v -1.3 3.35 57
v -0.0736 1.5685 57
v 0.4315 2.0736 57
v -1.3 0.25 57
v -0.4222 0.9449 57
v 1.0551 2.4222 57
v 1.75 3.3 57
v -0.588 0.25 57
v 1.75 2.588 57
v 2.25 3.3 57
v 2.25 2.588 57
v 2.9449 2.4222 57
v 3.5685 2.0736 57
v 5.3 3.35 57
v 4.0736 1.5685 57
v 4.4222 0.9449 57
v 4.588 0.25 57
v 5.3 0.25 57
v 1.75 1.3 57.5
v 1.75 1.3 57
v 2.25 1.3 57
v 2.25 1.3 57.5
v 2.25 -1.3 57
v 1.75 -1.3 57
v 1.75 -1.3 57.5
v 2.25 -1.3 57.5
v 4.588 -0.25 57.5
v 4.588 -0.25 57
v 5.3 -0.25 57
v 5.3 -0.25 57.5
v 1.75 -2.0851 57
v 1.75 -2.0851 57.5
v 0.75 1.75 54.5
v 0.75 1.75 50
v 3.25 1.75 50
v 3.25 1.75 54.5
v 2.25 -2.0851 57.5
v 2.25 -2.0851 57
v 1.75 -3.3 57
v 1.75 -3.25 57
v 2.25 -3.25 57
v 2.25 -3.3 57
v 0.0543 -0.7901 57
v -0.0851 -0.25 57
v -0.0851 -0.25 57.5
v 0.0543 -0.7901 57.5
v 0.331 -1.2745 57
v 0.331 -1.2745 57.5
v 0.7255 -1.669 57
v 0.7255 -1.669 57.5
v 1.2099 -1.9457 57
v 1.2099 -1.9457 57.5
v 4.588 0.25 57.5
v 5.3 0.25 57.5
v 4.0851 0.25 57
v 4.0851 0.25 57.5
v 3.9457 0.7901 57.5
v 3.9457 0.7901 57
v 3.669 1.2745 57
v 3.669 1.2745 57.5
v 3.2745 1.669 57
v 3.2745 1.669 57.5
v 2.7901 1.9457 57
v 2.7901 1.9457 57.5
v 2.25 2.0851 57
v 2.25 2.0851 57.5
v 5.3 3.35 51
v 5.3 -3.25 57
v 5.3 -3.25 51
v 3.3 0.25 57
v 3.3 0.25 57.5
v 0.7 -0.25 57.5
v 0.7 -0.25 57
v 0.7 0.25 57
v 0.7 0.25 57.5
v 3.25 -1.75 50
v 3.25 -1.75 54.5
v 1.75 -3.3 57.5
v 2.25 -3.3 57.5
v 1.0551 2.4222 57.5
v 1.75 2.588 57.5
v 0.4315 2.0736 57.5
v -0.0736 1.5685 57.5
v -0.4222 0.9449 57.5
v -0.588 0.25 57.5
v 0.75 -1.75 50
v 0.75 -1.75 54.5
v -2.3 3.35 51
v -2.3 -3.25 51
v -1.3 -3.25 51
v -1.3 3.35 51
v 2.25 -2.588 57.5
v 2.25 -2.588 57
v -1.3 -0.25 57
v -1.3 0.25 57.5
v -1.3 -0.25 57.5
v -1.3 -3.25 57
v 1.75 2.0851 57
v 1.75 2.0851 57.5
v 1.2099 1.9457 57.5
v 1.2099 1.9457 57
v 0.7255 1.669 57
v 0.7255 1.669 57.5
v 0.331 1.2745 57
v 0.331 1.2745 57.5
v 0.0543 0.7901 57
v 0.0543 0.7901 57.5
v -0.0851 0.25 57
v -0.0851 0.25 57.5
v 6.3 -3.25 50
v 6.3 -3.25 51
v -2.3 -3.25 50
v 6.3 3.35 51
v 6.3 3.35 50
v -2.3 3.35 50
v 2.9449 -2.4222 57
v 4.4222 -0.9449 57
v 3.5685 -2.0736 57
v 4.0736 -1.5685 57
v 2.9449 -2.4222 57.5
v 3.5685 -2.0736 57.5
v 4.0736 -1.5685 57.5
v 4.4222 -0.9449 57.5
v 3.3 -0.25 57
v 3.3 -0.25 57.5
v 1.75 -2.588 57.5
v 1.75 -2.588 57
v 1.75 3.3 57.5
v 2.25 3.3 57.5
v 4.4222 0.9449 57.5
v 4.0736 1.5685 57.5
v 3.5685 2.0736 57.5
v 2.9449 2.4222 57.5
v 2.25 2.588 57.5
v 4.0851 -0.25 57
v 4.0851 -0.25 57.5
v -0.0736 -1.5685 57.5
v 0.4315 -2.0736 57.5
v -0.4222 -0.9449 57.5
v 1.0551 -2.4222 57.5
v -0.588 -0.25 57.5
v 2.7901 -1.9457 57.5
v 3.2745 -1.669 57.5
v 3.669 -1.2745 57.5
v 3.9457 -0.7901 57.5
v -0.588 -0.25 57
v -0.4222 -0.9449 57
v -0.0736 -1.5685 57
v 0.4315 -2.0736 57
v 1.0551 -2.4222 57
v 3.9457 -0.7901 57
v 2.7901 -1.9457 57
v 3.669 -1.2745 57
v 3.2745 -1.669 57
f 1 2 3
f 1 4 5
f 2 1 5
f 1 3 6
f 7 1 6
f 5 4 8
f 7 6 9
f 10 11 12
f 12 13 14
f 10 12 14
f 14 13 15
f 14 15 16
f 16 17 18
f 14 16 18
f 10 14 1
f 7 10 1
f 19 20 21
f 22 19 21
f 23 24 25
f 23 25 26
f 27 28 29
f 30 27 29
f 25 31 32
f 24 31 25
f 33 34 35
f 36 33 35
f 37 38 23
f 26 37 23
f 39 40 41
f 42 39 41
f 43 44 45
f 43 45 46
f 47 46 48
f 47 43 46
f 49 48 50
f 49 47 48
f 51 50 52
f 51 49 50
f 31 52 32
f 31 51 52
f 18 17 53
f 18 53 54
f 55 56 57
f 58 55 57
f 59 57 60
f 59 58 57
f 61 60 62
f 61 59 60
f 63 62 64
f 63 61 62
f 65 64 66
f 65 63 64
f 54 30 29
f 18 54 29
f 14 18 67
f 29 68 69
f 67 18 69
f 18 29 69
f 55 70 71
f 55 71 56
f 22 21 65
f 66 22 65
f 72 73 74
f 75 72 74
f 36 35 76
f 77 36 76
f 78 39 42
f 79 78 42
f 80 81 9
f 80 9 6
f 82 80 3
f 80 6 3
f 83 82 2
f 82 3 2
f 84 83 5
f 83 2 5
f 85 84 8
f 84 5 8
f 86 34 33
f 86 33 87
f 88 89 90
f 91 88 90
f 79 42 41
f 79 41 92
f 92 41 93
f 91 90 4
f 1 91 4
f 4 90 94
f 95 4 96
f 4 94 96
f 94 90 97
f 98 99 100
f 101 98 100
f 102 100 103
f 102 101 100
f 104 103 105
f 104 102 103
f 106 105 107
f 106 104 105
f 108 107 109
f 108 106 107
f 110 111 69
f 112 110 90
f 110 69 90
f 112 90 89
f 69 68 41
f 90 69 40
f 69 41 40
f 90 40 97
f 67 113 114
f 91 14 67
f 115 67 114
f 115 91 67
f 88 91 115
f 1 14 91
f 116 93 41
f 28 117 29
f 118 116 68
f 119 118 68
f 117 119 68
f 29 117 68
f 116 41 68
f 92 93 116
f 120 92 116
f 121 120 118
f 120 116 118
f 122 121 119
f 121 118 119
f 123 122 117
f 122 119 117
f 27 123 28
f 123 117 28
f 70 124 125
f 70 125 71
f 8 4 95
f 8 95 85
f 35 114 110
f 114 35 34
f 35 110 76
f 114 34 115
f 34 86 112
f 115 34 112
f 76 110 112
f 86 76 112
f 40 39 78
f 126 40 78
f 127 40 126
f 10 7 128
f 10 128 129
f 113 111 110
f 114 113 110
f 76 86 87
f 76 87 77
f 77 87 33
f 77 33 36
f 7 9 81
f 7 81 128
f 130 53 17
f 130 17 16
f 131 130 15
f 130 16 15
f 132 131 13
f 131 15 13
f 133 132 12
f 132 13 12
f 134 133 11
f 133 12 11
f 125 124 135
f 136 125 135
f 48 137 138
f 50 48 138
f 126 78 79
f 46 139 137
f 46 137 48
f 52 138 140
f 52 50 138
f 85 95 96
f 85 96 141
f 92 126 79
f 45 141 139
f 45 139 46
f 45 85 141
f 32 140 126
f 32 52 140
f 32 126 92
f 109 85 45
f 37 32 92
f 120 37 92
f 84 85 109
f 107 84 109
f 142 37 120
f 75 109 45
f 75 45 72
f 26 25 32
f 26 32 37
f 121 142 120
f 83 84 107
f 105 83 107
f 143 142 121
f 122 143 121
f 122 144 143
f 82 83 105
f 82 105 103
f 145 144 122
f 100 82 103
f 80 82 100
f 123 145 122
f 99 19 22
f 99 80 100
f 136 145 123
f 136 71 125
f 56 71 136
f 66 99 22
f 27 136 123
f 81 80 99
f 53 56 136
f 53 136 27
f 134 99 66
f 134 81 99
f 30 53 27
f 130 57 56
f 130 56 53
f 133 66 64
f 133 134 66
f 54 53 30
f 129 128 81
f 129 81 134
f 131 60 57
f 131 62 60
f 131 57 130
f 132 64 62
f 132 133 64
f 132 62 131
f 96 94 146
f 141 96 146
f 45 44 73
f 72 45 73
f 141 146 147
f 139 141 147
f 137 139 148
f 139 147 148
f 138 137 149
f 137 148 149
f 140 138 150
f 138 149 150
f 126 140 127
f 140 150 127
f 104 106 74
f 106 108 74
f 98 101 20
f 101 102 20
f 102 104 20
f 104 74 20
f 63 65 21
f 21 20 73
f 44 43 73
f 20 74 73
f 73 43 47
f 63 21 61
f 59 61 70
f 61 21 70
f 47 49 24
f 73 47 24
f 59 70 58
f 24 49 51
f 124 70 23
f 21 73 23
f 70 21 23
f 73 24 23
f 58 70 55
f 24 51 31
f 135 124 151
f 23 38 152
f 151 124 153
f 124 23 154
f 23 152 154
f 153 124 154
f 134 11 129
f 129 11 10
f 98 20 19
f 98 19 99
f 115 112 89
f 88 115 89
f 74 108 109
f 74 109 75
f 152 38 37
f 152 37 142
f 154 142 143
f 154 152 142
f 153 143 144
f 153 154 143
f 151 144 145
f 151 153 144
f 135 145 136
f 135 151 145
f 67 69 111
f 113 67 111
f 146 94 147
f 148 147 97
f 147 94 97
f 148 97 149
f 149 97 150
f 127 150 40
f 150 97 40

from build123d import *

# Parameters (mm, degrees)
SKETCH040_W      = 0.5
SKETCH040_H      = 2
SKETCH040_W_2    = 2
SKETCH040_H_2    = 0.5
EXTRUDE046_DEPTH = 0.5
SKETCH014_W      = 2.5
SKETCH014_H      = 3.5
EXTRUDE015_DEPTH = 4.5
EXTRUDE014_DEPTH = 6.6
SKETCH038_R      = 2.6
SKETCH038_R_2    = 2.1
EXTRUDE_DEPTH    = 0.5


with BuildPart() as extrude046:
    # Sketch040 → Extrude046 (new body)
    with BuildSketch(Plane.XY.offset(20)):
        with Locations((0, 2.3)):
            Rectangle(SKETCH040_W, SKETCH040_H)
        with Locations((0, -2.3)):
            Rectangle(SKETCH040_W, SKETCH040_H)
        with Locations((-2.3, 0)):
            Rectangle(SKETCH040_W_2, SKETCH040_H_2)
        with Locations((2.3, 0)):
            Rectangle(SKETCH040_W_2, SKETCH040_H_2)
    extrude(amount=EXTRUDE046_DEPTH)


with BuildPart() as extrude046_1:
    # Extrude046 placement: moved
    add(extrude046.part.moved(Location((0, 0, -13))))


with BuildPart() as extrude015:
    # Sketch014 → Extrude015 (new body)
    with BuildSketch(Plane(origin=(0, 0, -10), x_dir=(1, 0, 0), z_dir=(0, 0, -1))):
        Rectangle(SKETCH014_W, SKETCH014_H)
    extrude(amount=-EXTRUDE015_DEPTH)


with BuildPart() as extrude015_1:
    # Extrude015 placement: moved
    add(extrude015.part.moved(Location((0, 0, 10))))


with BuildPart() as cap002:
    # Sketch013 → Extrude014 (new body)
    with BuildSketch(Plane.XZ.offset(10)):
        Polygon((-3.3, 7), (3.3, 7), (3.3, 1), (4.3, 1), (4.3, 0), (-4.3, 0), (-4.3, 1), (-3.3, 1), align=None)
    extrude(amount=-EXTRUDE014_DEPTH)


with BuildPart() as cap002_1:
    # Extrude014 placement: moved
    add(cap002.part.moved(Location((0, 6.75, 0))))

    # Cut023: cut Extrude015
    add(extrude015_1.part, mode=Mode.SUBTRACT)


with BuildPart() as focus:
    # Sketch038 → Extrude (new body)
    with BuildSketch(Plane.XY.offset(20)):
        Circle(SKETCH038_R)
        Circle(SKETCH038_R_2, mode=Mode.SUBTRACT)
    extrude(amount=EXTRUDE_DEPTH)


with BuildPart() as focus_1:
    # Extrude placement: moved
    add(focus.part.moved(Location((0, 0, -13))))

    # Fusion034: union Extrude046, cap002
    add(extrude046_1.part)
    add(cap002_1.part)


with BuildPart() as focus_2:
    # Fusion034 placement: moved
    add(focus_1.part.moved(Location((2, 0, 50))))


solid = focus_2.part
